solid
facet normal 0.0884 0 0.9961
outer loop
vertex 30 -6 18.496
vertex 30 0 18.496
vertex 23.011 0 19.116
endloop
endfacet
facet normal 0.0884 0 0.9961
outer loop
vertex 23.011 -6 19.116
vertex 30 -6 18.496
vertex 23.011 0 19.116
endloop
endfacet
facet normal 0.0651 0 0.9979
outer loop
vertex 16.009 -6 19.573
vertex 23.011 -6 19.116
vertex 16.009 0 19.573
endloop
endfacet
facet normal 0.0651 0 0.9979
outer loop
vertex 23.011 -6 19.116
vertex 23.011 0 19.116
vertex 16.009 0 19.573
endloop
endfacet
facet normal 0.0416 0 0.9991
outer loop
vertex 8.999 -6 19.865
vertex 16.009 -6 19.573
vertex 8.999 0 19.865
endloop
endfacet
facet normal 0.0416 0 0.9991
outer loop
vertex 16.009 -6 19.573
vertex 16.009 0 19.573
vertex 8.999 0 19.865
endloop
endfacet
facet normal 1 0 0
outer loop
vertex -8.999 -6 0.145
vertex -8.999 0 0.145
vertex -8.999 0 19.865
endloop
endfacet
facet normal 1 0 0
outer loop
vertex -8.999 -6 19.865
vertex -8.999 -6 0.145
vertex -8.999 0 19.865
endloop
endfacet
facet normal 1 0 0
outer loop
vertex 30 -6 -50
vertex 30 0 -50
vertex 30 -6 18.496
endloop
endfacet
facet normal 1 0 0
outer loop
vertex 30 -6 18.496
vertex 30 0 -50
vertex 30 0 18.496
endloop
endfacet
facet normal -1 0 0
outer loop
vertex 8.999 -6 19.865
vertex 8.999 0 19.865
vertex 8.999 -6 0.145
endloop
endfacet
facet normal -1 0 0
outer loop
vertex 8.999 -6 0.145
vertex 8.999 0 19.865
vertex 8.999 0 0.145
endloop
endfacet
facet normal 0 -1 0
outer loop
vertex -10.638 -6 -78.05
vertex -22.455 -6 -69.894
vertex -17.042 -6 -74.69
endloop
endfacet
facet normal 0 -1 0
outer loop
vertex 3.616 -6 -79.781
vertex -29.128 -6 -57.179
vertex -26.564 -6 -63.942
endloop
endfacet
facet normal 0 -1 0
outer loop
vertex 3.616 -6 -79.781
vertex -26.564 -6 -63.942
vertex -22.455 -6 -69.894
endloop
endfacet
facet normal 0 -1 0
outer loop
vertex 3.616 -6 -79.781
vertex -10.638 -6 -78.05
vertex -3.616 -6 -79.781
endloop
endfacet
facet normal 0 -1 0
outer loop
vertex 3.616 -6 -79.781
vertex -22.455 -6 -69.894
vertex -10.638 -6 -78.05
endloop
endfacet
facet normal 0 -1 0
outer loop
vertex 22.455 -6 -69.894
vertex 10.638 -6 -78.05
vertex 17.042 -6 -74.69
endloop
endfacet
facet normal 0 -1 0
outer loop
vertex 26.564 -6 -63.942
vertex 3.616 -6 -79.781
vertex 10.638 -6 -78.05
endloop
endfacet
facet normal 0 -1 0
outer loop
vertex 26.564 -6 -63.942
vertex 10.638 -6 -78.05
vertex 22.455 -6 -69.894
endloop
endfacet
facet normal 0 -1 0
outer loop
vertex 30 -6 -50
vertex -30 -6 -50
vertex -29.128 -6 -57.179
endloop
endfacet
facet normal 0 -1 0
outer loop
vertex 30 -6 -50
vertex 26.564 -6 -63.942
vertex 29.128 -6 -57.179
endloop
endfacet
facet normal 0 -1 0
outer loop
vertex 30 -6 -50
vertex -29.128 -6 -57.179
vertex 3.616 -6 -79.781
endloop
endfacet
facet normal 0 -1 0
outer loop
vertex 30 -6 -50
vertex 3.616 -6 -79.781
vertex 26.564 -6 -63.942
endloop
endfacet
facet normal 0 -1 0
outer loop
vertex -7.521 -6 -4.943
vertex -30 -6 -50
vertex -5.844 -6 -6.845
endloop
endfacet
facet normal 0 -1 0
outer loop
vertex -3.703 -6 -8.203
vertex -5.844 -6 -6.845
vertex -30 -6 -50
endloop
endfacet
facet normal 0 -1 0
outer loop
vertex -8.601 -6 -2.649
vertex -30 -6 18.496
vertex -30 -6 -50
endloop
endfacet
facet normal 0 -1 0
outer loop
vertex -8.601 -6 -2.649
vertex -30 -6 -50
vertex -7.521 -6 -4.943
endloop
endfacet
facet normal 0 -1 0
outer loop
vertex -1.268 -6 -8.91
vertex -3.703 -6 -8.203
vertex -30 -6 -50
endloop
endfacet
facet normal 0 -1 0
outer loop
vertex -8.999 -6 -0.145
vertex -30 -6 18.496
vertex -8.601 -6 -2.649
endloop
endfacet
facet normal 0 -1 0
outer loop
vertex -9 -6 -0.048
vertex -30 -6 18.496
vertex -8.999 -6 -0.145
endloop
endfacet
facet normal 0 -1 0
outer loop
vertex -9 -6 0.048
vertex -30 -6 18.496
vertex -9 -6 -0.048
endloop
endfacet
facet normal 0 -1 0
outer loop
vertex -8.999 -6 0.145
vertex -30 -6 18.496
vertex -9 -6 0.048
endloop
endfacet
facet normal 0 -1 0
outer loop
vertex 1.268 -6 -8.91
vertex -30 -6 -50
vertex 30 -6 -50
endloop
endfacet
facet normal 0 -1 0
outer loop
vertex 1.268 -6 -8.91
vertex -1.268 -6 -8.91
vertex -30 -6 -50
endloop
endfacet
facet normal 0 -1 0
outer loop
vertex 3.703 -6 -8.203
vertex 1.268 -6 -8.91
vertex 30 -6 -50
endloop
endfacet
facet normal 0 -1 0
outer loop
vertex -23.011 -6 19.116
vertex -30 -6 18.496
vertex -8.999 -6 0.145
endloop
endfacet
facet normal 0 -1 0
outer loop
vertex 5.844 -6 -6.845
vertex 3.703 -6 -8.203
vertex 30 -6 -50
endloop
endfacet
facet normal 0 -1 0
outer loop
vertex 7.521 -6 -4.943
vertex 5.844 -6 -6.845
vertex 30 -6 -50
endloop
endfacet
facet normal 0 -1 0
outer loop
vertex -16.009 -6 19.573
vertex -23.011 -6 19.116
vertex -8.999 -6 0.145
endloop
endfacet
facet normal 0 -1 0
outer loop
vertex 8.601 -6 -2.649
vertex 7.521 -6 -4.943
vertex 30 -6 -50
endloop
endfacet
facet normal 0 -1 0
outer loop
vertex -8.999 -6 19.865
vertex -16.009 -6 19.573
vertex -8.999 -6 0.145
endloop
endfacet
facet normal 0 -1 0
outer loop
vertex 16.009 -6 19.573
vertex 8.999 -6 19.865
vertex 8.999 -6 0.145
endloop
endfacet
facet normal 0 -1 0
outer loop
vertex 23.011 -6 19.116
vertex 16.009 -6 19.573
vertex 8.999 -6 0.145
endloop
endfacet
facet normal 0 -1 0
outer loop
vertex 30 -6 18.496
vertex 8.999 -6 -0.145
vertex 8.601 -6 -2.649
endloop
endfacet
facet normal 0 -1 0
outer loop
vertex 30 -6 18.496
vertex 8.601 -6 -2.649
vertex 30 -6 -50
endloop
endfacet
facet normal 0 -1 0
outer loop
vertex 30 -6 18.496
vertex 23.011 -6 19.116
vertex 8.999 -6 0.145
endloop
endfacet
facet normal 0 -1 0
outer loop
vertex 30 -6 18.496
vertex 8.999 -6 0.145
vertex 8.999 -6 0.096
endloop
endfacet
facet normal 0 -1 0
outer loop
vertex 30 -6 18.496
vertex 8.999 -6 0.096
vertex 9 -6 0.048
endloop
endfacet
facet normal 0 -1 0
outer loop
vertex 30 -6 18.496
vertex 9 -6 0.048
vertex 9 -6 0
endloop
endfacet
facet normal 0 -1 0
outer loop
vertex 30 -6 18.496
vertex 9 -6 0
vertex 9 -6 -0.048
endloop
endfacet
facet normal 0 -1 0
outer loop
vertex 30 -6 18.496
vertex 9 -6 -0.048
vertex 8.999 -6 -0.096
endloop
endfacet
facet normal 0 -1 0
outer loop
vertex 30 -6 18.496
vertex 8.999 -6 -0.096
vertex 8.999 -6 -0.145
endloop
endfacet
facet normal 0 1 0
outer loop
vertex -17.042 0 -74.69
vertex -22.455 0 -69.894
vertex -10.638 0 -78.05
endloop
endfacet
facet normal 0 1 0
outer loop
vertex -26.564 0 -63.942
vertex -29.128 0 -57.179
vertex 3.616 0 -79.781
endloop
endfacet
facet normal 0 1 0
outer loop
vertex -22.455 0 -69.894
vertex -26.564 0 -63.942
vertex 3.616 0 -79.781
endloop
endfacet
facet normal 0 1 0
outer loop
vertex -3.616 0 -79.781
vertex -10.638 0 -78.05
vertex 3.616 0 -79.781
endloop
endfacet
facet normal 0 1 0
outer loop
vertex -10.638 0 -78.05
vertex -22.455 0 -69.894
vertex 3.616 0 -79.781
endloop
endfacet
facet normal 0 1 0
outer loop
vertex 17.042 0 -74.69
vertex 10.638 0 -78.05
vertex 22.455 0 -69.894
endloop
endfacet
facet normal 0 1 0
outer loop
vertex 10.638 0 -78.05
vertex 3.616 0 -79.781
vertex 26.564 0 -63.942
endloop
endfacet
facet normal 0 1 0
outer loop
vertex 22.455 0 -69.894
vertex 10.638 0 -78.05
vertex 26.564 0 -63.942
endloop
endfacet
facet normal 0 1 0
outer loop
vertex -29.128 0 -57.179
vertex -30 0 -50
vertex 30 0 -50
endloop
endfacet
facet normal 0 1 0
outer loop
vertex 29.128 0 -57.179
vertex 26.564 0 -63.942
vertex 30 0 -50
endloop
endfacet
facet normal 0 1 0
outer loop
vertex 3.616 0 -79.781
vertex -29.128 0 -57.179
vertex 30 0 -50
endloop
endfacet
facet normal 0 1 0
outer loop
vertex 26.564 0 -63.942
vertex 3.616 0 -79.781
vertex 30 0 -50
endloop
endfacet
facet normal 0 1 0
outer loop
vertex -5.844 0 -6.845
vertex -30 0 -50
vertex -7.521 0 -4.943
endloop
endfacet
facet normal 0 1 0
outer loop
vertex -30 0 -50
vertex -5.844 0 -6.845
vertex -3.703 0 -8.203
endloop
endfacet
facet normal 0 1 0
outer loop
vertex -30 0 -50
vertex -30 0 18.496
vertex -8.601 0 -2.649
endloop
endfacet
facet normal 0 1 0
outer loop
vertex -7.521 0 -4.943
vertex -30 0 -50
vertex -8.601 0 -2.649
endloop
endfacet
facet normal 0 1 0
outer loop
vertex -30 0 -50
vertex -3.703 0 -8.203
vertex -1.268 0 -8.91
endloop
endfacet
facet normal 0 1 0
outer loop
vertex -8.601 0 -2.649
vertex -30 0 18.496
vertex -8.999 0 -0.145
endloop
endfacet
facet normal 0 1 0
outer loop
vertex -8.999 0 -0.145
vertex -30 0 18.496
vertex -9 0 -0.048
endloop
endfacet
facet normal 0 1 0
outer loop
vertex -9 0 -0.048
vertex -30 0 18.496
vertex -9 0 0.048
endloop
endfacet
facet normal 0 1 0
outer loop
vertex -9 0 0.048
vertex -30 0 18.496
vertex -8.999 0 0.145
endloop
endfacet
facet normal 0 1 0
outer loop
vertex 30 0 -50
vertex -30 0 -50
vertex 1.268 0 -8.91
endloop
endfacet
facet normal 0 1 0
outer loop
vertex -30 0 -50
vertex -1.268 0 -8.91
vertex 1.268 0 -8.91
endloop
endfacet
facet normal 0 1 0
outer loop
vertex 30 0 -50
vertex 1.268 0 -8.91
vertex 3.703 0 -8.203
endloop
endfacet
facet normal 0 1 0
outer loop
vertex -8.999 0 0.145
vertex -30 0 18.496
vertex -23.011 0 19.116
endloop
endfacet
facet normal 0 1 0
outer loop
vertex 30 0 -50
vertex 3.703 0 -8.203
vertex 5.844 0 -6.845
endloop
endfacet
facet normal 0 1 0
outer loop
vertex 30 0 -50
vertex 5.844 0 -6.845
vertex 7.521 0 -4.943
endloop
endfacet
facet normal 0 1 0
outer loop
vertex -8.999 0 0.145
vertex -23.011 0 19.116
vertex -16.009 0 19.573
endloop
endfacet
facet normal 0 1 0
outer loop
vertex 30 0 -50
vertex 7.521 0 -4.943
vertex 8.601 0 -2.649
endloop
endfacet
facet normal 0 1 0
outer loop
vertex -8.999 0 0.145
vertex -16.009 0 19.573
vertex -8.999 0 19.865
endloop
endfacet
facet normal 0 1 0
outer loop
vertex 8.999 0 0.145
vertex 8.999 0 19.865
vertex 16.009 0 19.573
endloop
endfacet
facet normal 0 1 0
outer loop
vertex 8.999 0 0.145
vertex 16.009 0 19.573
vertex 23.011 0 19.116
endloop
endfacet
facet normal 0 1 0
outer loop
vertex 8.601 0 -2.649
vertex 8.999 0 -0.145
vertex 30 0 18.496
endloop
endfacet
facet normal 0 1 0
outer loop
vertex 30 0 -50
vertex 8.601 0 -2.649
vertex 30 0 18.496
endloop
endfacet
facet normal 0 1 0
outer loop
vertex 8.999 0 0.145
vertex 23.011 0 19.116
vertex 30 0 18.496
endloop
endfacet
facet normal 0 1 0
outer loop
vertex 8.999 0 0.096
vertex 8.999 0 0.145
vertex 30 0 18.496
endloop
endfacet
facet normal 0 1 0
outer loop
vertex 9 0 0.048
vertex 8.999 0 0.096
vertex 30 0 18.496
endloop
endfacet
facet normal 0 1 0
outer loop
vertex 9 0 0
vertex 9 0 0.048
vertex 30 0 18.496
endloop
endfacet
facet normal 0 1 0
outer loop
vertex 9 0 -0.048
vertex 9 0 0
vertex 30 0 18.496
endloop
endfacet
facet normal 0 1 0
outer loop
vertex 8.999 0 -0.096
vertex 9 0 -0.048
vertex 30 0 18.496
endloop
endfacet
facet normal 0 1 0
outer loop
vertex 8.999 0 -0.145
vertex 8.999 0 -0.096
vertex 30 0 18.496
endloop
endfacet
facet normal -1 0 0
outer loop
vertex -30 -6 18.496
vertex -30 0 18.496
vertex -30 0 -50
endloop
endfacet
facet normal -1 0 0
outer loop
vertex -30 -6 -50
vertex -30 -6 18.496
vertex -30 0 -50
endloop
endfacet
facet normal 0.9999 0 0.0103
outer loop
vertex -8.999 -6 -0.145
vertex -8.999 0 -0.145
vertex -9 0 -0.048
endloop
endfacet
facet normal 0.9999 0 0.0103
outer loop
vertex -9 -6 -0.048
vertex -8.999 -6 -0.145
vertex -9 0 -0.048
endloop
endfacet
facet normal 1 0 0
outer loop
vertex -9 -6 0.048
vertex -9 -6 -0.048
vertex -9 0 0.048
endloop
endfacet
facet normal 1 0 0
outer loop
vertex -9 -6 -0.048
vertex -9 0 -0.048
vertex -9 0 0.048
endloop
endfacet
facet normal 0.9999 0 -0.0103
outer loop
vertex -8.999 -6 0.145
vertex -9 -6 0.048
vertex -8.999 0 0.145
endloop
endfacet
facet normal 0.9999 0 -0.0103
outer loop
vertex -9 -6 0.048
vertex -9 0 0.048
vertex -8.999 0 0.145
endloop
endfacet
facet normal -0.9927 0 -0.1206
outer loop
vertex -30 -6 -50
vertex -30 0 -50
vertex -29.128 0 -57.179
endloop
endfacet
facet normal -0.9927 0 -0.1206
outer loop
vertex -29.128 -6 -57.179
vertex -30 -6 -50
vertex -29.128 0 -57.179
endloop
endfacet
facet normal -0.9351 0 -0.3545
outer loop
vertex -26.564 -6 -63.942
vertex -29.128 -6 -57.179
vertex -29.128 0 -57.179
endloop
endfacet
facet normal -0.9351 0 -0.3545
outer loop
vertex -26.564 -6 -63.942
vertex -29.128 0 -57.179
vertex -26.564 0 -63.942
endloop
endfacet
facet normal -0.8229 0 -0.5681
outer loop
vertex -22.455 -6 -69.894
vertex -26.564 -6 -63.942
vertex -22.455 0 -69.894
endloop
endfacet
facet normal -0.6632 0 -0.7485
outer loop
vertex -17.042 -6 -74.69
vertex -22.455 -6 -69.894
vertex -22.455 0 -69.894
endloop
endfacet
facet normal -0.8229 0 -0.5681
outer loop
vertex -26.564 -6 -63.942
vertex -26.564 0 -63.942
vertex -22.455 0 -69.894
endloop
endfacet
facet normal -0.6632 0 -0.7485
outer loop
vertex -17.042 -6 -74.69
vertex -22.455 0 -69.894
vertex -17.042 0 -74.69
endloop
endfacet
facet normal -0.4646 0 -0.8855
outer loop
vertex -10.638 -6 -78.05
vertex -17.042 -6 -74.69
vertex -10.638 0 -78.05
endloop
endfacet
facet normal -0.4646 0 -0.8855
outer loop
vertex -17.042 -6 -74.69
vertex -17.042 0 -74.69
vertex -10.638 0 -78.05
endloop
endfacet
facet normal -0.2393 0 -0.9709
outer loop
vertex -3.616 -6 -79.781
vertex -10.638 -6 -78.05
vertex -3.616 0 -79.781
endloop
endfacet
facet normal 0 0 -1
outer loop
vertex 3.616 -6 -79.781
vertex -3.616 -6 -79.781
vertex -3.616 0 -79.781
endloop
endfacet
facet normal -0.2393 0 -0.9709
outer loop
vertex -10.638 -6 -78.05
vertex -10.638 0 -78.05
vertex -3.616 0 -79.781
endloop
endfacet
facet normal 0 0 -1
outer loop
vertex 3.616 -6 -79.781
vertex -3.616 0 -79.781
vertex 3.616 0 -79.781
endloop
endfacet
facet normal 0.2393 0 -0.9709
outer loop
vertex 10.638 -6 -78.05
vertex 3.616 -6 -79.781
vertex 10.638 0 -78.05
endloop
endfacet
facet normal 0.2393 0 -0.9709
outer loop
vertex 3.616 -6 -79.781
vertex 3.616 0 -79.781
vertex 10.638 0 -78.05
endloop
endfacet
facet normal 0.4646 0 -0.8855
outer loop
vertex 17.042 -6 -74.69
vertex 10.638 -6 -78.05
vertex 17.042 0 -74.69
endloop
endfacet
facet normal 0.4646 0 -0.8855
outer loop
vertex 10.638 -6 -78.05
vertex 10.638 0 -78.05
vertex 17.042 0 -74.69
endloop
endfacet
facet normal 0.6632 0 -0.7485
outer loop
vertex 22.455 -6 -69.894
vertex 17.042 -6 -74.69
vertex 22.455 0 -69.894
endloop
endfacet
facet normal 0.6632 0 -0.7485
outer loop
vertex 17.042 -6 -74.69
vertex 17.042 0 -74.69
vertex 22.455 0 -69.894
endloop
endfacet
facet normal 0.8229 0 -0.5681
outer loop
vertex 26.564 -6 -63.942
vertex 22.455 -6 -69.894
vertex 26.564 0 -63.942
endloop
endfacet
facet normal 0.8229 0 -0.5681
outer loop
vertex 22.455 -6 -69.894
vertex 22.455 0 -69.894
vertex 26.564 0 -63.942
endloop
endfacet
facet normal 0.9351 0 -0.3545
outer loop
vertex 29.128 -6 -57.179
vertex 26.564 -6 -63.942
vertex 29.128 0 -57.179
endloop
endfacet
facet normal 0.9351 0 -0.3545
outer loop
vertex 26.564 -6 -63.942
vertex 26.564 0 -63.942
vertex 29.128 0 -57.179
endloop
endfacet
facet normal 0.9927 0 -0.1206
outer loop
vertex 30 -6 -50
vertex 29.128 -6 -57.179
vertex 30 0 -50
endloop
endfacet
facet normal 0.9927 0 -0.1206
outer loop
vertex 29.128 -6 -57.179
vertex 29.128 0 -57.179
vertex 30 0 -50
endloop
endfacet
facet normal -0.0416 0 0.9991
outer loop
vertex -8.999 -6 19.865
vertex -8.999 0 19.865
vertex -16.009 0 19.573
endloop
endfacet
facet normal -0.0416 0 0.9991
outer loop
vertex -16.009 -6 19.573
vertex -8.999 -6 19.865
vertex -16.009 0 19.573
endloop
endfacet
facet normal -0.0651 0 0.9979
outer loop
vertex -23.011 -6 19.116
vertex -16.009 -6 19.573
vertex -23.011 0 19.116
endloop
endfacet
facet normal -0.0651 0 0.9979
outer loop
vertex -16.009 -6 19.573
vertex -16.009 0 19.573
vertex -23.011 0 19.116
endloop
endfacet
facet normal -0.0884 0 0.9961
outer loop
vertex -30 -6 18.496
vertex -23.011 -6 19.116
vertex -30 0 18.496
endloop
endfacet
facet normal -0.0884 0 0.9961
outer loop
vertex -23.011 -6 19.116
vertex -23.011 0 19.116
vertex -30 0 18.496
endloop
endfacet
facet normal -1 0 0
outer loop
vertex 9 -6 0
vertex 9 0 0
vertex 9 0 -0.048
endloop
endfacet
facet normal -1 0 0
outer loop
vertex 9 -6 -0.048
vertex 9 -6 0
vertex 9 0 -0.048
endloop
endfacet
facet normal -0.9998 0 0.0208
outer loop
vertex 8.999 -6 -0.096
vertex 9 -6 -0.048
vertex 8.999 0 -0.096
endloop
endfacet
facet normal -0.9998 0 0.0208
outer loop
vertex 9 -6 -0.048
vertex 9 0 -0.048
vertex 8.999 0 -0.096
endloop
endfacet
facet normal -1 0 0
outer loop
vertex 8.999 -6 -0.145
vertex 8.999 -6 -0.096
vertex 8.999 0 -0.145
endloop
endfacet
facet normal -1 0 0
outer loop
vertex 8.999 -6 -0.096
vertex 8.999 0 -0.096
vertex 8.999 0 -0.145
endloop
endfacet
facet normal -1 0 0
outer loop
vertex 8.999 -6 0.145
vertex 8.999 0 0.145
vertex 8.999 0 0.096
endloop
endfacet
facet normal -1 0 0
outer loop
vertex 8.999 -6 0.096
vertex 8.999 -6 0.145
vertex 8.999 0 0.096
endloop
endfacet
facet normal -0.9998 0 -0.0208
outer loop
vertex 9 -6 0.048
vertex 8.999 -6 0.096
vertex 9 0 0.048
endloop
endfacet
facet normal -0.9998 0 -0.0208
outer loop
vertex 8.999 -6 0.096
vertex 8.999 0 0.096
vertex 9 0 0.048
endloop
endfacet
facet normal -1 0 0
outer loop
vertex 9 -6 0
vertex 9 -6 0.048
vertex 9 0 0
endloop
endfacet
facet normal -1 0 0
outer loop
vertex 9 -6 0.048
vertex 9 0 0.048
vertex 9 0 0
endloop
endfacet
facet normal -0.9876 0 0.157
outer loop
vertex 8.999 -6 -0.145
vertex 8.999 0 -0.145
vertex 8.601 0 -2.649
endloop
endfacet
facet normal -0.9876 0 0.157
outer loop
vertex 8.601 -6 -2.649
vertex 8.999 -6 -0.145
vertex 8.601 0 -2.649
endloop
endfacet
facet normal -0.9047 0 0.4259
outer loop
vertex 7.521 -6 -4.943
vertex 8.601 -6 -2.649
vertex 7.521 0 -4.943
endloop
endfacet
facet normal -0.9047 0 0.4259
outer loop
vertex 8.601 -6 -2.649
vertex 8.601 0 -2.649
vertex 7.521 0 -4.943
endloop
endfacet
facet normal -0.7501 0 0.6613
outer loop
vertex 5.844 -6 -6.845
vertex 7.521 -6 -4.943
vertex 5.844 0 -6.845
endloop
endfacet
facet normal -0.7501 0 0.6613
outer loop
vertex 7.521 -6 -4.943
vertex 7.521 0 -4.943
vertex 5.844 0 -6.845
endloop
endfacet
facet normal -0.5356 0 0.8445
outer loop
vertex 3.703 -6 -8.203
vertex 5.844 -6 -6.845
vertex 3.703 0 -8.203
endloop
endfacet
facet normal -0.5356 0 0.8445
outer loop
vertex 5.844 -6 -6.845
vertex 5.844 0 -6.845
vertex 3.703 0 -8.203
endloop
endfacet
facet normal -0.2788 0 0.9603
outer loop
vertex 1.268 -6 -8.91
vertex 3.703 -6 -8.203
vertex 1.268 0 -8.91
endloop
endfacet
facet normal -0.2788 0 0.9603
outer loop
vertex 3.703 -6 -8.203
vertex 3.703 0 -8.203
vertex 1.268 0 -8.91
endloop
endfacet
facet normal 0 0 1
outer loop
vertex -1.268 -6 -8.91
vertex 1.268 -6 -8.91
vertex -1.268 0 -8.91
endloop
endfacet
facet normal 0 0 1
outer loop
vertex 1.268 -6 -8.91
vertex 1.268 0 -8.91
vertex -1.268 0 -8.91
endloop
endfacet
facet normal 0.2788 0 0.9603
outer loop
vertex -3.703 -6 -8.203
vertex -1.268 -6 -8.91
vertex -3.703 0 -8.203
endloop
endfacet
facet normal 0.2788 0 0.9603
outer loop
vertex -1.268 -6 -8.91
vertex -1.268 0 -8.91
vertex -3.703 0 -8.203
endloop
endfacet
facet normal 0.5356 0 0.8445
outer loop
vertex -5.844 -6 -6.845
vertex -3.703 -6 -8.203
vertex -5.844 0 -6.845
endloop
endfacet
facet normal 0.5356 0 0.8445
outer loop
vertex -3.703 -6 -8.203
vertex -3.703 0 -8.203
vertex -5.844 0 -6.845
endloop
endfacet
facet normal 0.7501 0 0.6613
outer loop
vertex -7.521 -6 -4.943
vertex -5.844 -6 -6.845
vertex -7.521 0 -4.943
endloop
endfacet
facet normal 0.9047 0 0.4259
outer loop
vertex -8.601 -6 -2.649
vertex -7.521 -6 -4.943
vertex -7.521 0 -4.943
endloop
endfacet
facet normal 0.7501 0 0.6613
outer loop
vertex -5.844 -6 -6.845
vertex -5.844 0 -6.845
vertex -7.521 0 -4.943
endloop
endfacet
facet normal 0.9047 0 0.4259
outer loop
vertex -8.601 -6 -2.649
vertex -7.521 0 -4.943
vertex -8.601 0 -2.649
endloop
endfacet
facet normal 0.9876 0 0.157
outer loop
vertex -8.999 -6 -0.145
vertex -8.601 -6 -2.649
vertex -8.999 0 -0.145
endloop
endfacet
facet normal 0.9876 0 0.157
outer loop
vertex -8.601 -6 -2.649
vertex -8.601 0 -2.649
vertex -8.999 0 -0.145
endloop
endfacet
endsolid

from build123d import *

# Parameters (mm, degrees)
F1_DEPTH = 6


with BuildPart() as f1:
    # F0 (on Front) → F1 (new body)
    with BuildSketch(Plane.XZ):
        with BuildLine():
            ThreePointArc((8.998838, -0.144643), (0, -9), (-8.998838, -0.144643))
            ThreePointArc((-8.998838, -0.144643), (-9, 0), (-8.998838, 0.144643))
            Line((-8.998838, 0.144643), (-8.998838, 19.865004))
            ThreePointArc((-8.998838, 19.865004), (-19.511425, 19.364835), (-30, 18.496231))
            Line((-30, 18.496231), (-30, -50))
            ThreePointArc((-30, -50), (0, -20), (30, -50))
            Line((30, -50), (30, 18.496231))
            ThreePointArc((30, 18.496231), (19.511425, 19.364835), (8.998838, 19.865004))
            Line((8.998838, 19.865004), (8.998838, 0.144643))
            ThreePointArc((8.998838, 0.144643), (8.999709, 0.072324), (9, 0))
            ThreePointArc((9, 0), (8.999709, -0.072324), (8.998838, -0.144643))
        make_face()
        with BuildLine():
            ThreePointArc((30, -50), (0, -20), (-30, -50))
            ThreePointArc((-30, -50), (0, -80), (30, -50))
        make_face()
    extrude(amount=F1_DEPTH)


solid = f1.part
